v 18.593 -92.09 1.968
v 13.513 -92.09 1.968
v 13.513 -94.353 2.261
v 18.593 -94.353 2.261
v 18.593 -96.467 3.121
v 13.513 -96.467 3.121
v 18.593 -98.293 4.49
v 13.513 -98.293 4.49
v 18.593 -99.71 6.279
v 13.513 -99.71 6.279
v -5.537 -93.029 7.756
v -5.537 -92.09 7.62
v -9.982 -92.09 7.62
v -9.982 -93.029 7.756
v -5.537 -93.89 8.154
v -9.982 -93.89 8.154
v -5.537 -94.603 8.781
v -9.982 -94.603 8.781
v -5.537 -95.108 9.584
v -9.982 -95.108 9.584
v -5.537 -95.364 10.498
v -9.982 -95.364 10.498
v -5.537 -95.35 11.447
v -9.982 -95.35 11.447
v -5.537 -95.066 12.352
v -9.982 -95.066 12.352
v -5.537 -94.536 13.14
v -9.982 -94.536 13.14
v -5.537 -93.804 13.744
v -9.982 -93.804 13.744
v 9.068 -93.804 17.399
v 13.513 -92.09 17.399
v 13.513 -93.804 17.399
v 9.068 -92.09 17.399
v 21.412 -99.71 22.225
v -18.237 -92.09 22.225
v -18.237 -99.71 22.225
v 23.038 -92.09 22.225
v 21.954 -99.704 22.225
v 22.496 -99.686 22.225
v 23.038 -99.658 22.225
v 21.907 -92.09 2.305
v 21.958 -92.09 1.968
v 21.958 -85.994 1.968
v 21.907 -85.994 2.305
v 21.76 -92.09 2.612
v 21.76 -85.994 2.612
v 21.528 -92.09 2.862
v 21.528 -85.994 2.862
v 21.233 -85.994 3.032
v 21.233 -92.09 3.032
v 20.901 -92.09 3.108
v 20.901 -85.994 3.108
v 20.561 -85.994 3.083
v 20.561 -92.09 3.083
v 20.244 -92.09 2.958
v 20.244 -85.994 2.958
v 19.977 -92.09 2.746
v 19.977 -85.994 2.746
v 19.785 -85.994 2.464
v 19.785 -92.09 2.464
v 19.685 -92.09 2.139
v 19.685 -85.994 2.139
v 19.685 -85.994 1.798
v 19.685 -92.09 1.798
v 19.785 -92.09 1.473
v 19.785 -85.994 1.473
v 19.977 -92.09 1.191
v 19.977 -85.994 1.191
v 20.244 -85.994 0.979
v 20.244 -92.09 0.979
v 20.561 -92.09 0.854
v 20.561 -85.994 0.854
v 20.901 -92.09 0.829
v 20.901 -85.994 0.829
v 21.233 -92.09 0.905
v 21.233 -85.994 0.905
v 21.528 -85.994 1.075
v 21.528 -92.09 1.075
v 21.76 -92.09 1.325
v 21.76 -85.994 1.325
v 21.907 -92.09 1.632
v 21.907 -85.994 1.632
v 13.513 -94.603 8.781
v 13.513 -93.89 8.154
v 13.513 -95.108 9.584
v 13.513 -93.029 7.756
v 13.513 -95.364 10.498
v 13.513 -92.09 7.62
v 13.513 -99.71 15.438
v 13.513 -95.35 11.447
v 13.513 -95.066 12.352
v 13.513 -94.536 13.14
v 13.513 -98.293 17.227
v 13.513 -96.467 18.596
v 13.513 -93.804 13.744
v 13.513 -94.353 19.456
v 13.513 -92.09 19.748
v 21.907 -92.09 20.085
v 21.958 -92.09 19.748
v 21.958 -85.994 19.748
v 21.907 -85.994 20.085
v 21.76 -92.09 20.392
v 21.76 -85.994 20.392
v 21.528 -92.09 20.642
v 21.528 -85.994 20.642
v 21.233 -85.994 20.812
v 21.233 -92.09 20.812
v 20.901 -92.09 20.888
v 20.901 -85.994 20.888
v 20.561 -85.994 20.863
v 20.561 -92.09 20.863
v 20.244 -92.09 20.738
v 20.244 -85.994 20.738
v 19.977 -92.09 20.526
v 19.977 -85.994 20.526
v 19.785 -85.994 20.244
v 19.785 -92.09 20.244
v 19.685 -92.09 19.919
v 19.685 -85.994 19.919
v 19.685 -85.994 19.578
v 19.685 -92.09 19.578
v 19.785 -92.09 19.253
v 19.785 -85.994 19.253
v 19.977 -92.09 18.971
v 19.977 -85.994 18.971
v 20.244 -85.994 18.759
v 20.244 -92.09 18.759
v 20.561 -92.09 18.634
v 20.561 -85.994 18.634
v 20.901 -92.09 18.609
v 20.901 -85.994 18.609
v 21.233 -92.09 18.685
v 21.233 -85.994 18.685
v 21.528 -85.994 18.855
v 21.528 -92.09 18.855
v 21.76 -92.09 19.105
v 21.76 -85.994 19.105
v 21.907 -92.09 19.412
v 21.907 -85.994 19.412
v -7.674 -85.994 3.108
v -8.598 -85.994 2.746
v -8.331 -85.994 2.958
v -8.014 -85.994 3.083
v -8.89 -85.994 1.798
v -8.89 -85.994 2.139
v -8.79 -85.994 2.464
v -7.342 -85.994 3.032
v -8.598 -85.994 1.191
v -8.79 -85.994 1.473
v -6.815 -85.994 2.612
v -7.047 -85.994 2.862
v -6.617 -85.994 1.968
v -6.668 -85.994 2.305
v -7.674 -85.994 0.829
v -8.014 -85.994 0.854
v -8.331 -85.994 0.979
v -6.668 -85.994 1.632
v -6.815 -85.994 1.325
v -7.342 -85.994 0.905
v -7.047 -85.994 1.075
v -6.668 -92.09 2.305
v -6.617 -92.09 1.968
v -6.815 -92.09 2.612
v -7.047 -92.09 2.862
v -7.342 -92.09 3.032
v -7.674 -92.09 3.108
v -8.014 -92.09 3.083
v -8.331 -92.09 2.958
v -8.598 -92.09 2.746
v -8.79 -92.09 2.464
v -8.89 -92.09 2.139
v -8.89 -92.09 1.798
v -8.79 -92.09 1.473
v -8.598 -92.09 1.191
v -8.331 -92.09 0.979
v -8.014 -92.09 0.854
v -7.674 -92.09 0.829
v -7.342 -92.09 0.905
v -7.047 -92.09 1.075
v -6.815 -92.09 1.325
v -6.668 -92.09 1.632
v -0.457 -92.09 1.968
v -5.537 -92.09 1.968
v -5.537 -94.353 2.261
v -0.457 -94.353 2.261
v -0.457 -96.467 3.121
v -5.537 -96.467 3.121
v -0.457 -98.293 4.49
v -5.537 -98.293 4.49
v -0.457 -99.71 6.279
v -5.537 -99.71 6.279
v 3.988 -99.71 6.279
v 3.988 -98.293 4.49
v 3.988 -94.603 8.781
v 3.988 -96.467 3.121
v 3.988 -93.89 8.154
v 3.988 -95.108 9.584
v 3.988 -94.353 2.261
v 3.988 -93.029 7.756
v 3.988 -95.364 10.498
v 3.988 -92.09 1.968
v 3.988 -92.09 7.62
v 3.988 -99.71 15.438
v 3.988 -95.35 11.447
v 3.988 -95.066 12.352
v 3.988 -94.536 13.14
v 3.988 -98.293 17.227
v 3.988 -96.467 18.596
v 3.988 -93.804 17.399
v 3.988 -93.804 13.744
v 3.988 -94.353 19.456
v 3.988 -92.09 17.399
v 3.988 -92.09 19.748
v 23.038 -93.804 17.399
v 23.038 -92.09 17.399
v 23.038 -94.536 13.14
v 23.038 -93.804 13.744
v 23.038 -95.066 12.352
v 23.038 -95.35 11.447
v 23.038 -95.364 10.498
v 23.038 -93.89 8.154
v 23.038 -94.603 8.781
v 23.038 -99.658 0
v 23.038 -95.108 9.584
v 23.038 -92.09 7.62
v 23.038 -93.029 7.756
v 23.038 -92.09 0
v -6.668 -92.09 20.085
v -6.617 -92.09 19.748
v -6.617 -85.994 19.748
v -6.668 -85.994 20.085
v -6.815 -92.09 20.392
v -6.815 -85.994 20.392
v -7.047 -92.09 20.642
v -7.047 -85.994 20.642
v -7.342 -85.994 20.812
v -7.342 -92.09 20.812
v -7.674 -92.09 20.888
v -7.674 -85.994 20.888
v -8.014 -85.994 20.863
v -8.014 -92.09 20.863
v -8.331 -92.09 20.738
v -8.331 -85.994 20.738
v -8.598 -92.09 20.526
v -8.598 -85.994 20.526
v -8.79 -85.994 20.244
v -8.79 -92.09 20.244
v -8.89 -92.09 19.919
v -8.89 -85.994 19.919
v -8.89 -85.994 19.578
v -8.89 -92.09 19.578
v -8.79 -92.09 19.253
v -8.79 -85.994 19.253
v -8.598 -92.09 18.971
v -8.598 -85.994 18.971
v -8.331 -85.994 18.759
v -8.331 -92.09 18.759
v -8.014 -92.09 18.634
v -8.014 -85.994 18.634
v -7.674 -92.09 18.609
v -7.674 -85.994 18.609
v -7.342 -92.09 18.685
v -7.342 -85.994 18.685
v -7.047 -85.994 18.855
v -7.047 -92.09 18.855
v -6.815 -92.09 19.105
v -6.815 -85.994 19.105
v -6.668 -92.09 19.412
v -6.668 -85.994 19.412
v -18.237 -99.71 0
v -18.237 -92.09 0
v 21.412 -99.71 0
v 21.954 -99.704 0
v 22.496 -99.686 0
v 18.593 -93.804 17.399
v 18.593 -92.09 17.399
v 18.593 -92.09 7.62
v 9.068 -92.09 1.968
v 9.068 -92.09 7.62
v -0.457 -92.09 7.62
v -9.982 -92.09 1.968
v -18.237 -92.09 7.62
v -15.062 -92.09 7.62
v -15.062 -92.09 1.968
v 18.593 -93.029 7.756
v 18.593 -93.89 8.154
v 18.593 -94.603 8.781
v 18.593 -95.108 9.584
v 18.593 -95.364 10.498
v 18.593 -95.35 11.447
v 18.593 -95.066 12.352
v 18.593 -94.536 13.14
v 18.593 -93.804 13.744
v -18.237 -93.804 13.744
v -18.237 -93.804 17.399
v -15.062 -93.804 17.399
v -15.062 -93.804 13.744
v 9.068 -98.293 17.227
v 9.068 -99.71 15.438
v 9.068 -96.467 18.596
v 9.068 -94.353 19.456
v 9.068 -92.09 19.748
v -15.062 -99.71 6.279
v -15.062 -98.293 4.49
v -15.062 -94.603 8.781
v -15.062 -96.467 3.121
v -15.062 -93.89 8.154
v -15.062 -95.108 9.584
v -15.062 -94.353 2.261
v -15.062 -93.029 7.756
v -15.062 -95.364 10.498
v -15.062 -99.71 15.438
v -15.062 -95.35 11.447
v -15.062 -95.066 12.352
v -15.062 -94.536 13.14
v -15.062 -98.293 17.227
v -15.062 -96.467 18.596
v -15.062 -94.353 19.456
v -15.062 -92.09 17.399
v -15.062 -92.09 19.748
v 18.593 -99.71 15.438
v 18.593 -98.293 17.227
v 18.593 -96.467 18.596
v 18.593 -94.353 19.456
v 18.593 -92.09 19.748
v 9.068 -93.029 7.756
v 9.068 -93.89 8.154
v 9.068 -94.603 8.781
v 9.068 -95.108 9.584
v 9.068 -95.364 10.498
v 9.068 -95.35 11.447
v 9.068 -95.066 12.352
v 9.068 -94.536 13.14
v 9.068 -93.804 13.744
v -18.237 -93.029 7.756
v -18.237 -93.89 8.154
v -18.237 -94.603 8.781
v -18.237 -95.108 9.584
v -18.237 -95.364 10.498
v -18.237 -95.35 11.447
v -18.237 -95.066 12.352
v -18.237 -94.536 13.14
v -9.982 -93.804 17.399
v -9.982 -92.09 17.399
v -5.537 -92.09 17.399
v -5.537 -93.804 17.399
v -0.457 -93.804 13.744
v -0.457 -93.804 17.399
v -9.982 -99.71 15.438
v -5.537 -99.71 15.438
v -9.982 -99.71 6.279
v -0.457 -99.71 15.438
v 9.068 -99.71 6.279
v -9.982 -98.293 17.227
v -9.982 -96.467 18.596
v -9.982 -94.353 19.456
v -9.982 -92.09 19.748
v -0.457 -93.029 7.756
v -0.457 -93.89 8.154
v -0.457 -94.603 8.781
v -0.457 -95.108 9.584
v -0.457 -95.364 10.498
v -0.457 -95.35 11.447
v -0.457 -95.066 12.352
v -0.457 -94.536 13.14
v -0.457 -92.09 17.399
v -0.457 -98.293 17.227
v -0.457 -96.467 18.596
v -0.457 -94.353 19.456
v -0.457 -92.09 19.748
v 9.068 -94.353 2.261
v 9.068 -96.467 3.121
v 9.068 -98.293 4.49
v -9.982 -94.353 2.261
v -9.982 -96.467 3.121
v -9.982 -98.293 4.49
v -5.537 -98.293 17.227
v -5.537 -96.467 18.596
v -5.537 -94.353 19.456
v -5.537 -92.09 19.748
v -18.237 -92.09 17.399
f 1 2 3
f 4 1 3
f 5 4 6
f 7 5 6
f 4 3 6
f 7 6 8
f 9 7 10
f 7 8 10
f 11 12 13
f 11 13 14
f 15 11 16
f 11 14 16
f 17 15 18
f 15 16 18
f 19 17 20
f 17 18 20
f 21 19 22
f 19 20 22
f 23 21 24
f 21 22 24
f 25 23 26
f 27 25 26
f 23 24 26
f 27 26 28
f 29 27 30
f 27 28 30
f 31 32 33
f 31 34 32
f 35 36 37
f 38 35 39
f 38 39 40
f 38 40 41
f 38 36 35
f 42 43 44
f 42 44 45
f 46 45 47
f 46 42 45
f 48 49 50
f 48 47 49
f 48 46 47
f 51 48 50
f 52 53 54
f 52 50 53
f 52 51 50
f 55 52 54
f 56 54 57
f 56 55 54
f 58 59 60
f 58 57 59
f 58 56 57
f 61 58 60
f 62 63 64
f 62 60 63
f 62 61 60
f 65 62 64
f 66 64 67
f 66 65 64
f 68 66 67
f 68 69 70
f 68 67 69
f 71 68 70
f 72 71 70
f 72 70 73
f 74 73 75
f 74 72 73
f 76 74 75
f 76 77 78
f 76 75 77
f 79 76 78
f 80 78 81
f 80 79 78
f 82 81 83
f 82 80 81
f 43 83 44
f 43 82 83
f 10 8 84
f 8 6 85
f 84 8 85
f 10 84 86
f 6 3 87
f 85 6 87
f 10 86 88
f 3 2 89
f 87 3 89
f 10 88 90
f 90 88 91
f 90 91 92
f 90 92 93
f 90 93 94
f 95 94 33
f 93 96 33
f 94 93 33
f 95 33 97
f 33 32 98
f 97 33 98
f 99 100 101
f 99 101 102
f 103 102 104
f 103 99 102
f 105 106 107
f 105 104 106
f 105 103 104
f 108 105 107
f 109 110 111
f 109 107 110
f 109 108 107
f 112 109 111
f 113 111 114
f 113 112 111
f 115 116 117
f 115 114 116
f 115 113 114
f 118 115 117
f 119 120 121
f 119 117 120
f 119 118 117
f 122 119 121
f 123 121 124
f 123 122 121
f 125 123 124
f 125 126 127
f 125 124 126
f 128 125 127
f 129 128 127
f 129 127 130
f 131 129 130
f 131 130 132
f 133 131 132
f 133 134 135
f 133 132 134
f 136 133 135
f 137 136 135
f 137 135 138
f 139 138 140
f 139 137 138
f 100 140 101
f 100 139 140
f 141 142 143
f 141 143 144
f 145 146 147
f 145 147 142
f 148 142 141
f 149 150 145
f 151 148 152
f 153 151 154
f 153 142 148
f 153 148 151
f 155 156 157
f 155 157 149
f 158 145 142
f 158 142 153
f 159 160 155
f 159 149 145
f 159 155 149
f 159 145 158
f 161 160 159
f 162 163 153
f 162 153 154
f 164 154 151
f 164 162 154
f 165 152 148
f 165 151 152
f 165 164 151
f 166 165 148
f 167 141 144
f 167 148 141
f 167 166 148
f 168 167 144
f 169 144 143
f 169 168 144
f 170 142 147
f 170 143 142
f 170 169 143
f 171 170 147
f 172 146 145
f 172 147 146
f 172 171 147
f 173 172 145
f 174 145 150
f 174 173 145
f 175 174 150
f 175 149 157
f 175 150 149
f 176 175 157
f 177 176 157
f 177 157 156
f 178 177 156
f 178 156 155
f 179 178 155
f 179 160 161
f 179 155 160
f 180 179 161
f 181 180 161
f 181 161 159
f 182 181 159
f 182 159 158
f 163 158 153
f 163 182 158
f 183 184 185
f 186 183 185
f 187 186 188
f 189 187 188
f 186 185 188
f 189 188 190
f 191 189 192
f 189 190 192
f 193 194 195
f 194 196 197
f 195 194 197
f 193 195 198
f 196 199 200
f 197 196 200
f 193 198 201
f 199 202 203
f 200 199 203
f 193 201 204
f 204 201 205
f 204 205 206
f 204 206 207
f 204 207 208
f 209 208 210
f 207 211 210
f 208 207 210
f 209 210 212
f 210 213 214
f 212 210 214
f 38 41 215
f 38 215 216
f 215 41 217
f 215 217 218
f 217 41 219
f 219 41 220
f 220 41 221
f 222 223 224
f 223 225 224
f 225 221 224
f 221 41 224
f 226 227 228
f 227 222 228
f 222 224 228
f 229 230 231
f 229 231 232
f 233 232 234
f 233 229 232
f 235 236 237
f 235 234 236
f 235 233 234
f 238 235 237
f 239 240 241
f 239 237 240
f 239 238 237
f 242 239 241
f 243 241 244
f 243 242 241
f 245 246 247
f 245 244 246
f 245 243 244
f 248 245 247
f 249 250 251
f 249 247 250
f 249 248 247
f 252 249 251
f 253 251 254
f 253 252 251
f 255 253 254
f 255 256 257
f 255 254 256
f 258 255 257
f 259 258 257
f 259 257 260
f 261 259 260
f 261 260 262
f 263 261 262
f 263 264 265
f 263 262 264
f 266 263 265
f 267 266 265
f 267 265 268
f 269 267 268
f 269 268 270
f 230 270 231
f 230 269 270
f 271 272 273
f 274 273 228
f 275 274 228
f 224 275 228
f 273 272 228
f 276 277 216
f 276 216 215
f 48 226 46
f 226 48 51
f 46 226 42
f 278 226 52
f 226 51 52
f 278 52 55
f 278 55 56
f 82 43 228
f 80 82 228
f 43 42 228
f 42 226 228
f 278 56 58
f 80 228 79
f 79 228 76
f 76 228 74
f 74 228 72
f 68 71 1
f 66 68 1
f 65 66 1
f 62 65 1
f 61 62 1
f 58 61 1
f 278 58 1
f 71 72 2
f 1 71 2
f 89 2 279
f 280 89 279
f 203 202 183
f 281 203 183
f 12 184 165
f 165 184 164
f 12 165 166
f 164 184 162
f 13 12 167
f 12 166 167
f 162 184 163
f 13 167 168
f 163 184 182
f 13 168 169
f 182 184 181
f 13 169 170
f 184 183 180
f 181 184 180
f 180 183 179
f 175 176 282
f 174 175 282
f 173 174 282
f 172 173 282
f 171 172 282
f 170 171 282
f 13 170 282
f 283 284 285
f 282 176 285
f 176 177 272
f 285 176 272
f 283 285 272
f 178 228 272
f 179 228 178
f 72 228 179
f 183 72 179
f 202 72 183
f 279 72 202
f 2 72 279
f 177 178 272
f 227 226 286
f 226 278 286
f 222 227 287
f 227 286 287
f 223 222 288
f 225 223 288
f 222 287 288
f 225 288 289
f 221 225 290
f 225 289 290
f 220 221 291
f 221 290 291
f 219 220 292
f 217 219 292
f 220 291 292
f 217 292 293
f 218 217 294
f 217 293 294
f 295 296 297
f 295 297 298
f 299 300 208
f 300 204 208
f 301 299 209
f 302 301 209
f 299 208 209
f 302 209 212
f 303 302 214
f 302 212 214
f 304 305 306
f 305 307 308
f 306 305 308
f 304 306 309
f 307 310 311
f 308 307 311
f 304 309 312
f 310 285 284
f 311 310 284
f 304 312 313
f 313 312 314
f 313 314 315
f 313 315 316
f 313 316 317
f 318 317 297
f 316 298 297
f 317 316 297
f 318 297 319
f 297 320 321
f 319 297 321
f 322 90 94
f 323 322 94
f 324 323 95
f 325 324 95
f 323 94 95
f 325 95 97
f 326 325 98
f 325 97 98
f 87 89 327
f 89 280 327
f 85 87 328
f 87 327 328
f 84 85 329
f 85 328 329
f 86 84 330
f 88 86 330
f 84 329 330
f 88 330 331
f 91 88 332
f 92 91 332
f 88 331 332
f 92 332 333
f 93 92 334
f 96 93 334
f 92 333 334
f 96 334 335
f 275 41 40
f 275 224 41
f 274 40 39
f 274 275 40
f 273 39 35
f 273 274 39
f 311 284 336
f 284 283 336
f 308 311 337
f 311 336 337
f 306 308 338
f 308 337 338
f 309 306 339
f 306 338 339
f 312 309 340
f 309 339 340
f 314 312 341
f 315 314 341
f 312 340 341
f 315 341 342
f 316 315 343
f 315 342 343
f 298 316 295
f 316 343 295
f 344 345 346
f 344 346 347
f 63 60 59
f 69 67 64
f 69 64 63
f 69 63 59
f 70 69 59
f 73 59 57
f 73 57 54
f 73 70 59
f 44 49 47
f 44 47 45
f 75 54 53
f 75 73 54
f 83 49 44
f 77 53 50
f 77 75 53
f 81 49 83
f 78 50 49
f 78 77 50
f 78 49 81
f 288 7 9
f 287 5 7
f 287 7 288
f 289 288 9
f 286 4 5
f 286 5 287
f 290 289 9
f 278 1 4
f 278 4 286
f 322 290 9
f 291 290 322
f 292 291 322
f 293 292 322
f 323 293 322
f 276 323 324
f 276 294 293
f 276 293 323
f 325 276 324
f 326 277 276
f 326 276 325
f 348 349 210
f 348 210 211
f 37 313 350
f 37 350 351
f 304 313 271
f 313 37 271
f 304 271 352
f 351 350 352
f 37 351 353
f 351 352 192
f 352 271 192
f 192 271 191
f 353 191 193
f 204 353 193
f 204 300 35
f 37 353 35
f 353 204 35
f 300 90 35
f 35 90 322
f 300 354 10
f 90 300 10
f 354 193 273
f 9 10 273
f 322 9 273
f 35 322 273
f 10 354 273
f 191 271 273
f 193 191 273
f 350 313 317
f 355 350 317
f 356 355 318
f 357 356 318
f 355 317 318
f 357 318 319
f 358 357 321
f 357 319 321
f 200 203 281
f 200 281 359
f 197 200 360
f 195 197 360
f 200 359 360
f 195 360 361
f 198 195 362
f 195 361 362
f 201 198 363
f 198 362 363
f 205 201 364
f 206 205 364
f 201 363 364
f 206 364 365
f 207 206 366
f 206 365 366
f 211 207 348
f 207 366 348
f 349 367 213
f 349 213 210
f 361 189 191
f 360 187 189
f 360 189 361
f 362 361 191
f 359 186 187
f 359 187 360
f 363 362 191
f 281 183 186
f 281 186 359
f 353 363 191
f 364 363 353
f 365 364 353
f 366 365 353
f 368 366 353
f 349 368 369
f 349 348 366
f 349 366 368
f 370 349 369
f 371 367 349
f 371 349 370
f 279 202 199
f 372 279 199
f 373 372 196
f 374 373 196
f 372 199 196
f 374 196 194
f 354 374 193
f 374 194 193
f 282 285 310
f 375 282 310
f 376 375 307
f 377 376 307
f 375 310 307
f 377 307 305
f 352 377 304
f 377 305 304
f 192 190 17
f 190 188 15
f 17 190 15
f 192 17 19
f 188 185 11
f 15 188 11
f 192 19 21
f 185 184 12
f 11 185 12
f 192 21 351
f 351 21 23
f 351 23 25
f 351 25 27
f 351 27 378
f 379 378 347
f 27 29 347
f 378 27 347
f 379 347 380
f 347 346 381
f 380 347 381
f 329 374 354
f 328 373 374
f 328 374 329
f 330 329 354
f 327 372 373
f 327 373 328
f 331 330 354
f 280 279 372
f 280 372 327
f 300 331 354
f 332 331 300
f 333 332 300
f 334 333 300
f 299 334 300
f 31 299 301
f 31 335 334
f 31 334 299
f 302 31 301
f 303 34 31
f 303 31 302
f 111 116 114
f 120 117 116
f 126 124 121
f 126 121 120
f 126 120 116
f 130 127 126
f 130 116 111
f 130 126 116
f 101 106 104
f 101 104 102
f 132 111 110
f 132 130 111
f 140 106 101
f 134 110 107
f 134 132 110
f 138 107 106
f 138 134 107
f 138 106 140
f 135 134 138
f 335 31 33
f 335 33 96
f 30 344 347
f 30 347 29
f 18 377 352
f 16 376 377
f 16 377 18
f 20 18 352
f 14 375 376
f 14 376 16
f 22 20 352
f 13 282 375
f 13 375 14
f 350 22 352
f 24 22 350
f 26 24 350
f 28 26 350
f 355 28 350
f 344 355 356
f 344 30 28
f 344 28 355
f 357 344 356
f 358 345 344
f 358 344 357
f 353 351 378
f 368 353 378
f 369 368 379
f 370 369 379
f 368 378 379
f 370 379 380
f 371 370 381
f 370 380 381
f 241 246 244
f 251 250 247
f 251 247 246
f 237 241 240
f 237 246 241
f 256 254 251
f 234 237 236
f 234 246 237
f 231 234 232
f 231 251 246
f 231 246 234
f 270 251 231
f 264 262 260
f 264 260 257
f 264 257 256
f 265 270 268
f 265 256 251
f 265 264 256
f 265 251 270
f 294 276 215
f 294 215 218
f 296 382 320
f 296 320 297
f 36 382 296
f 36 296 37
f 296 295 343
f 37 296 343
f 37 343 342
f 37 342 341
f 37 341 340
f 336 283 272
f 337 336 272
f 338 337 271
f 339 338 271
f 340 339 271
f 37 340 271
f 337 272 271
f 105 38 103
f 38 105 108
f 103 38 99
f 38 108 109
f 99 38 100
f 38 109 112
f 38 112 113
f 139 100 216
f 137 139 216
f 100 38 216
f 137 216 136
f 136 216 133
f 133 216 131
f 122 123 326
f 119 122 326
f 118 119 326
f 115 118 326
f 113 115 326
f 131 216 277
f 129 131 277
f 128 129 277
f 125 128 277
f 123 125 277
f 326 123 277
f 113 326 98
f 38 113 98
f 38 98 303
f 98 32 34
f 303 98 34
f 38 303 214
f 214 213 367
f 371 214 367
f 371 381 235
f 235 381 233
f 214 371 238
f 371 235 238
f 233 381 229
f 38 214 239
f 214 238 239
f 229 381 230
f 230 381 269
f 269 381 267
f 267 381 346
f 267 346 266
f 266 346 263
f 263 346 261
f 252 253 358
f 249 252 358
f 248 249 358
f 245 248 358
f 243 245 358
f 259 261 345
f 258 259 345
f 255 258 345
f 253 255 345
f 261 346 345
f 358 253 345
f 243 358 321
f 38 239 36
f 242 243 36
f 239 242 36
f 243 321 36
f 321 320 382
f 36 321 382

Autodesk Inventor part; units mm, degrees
ref_plane "YZ Plane" through (0, 0, 0) normal (1, 0, 0) x (0, 1, 0)
ref_plane "XZ Plane" through (0, 0, 0) normal (0, 1, 0) x (-1, 0, 0)
sketch "Sketch1" plane through (0, 0, 0) normal (0, 0, 1) x (1, 0, 0)
  arc A0 (-18.2373, -76.3503) -> (26.9537, -71.5105) centre (0, -33.2365) ccw projected
  line L0 (26.9537, -71.5105) -> (46.8123, -71.5105) projected
  line L1 (46.8123, -71.5105) -> (46.8123, -74.3095) projected
  arc A1 (23.0377, -99.6575) -> (46.8123, -74.3095) centre (21.4123, -74.3095) ccw projected
  line L2 (23.0377, -99.6575) -> (23.0377, -92.0895) projected
  line L3 (23.0377, -92.0895) -> (-18.2373, -92.0895) projected
  line L4 (-18.2373, -76.3503) -> (-18.2373, -92.0895) projected
  arc A2 (21.4123, -99.7095) -> (46.8123, -74.3095) centre (21.4123, -74.3095) ccw projected
  line L5 (46.8123, -74.3095) -> (46.8123, -71.5105) projected
  line L6 (46.8123, -71.5105) -> (26.9537, -71.5105) projected
  arc A3 (-26.9537, -71.5105) -> (26.9537, -71.5105) centre (0, -33.2365) ccw projected
  line L7 (-26.9537, -71.5105) -> (-46.8123, -71.5105) projected
  line L8 (-46.8123, -71.5105) -> (-46.8123, -74.3095) projected
  arc A4 (-46.8123, -74.3095) -> (-21.4123, -99.7095) centre (-21.4123, -74.3095) ccw projected
  line L9 (-21.4123, -99.7095) -> (21.4123, -99.7095) projected
  line L10 (-18.2373, -92.0895) -> (-18.2373, -99.7095)
  line L11 (-18.2373, -92.0895) -> (23.0377, -92.0895)
  line L12 (23.0377, -92.0895) -> (23.0377, -99.6575)
  point P0 (0, 0)
ref_plane "Work Plane1" through (-46.8123, -99.7095, 22.225) normal (0, 0, -1) x (0, 1, 0)
extrude "Extrusion1" add sketch "Sketch1" along normal up to surface (22.225 mm away) contours L3 L2 A2 L9 L10
sketch "Sketch2" plane through (-18.2373, -92.0895, 22.225) normal (0, 1, 0) x (1, 0, 0)
  circle A0 centre (39.0525, 2.4765) radius 1.27 projected
  circle A1 centre (39.0525, 20.2565) radius 1.27 projected
  circle A2 centre (10.4775, 20.2565) radius 1.27 projected
  circle A3 centre (10.4775, 2.4765) radius 1.27 projected
  circle A4 centre (39.0525, 2.4765) radius 1.143
  circle A5 centre (39.0525, 20.2565) radius 1.143
  circle A6 centre (10.4775, 2.4765) radius 1.143
  circle A7 centre (10.4775, 20.2565) radius 1.143
  point P0 (18.2373, 22.225)
  dimension "d4" = 0.127
  dimension "d5" = 0.127
  dimension "d6" = 0.127
  dimension "d7" = 0.127
extrude "Extrusion2" add sketch "Sketch2" along normal blind 6.096 contours A4 | A5 | A6 | A7
ref_plane "Work Plane2" through (-15.0623, -99.7095, 0) normal (-1, 0, 0) x (0, 0, 1)
sketch "Sketch3" plane through (-15.0623, -99.7095, 0) normal (-1, 0, 0) x (0, 0, 1)
  arc A0 (8.8042, -0.8832) -> (13.0521, -0.8802) centre (10.922, 7.62) ccw projected
  circle A1 centre (10.922, 7.62) radius 3.175 projected
  line L0 (13.744, 9.3345) -> (17.399, 9.3345) projected
  line L1 (17.399, 9.3345) -> (17.399, 7.62) projected
  line L2 (17.399, 9.3345) -> (17.399, 5.9055) projected
  line L3 (17.399, 5.9055) -> (13.744, 5.9055) projected
  arc A2 (13.744, 9.3345) -> (13.744, 5.9055) centre (10.922, 7.62) ccw projected
  arc A3 (19.7485, 7.62) -> (1.9685, 7.62) centre (10.8585, 7.62) ccw projected
  arc A4 (1.9685, 7.62) -> (19.7485, 7.62) centre (10.8585, 7.62) ccw
  line L4 (19.7485, 7.62) -> (17.399, 7.62)
  line L5 (18.6055, 7.62) -> (20.8915, 7.62) projected
  line L6 (0, 7.62) -> (22.225, 7.62) projected
  line L7 (7.62, 7.62) -> (1.9685, 7.62)
  point P0 (0, 99.7095)
extrude "Extrusion3" cut sketch "Sketch3" against normal blind 5.08
pattern_linear "Rectangular Pattern1" count 4 spacing 9.525 along (1, 0, 0) of "Extrusion3"
sketch "Sketch4" plane through (-18.2373, -99.7095, 0) normal (-1, 0, 0) x (0, 0, 1)
  line L0 (17.399, 9.3345) -> (17.399, 5.9055) projected
  line L1 (17.399, 5.9055) -> (13.744, 5.9055) projected
  arc A0 (13.744, 9.3345) -> (13.744, 5.9055) centre (10.922, 7.62) ccw projected
  line L2 (1.9685, 7.62) -> (19.7485, 7.62) projected
  line L3 (17.399, 7.62) -> (7.62, 7.62)
  point P0 (0, 99.7095)
extrude "Extrusion4" cut sketch "Sketch4" against normal through all
properties part number "lock housing front"
